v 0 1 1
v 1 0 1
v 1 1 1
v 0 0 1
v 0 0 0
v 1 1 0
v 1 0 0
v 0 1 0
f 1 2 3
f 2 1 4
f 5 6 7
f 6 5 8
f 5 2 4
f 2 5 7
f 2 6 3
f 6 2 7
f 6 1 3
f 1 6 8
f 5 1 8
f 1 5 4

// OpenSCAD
// --- Parameters ---
shoe_height = 34;
leg_height = 87 + shoe_height;
leg_depth = 4.3;
cube();
